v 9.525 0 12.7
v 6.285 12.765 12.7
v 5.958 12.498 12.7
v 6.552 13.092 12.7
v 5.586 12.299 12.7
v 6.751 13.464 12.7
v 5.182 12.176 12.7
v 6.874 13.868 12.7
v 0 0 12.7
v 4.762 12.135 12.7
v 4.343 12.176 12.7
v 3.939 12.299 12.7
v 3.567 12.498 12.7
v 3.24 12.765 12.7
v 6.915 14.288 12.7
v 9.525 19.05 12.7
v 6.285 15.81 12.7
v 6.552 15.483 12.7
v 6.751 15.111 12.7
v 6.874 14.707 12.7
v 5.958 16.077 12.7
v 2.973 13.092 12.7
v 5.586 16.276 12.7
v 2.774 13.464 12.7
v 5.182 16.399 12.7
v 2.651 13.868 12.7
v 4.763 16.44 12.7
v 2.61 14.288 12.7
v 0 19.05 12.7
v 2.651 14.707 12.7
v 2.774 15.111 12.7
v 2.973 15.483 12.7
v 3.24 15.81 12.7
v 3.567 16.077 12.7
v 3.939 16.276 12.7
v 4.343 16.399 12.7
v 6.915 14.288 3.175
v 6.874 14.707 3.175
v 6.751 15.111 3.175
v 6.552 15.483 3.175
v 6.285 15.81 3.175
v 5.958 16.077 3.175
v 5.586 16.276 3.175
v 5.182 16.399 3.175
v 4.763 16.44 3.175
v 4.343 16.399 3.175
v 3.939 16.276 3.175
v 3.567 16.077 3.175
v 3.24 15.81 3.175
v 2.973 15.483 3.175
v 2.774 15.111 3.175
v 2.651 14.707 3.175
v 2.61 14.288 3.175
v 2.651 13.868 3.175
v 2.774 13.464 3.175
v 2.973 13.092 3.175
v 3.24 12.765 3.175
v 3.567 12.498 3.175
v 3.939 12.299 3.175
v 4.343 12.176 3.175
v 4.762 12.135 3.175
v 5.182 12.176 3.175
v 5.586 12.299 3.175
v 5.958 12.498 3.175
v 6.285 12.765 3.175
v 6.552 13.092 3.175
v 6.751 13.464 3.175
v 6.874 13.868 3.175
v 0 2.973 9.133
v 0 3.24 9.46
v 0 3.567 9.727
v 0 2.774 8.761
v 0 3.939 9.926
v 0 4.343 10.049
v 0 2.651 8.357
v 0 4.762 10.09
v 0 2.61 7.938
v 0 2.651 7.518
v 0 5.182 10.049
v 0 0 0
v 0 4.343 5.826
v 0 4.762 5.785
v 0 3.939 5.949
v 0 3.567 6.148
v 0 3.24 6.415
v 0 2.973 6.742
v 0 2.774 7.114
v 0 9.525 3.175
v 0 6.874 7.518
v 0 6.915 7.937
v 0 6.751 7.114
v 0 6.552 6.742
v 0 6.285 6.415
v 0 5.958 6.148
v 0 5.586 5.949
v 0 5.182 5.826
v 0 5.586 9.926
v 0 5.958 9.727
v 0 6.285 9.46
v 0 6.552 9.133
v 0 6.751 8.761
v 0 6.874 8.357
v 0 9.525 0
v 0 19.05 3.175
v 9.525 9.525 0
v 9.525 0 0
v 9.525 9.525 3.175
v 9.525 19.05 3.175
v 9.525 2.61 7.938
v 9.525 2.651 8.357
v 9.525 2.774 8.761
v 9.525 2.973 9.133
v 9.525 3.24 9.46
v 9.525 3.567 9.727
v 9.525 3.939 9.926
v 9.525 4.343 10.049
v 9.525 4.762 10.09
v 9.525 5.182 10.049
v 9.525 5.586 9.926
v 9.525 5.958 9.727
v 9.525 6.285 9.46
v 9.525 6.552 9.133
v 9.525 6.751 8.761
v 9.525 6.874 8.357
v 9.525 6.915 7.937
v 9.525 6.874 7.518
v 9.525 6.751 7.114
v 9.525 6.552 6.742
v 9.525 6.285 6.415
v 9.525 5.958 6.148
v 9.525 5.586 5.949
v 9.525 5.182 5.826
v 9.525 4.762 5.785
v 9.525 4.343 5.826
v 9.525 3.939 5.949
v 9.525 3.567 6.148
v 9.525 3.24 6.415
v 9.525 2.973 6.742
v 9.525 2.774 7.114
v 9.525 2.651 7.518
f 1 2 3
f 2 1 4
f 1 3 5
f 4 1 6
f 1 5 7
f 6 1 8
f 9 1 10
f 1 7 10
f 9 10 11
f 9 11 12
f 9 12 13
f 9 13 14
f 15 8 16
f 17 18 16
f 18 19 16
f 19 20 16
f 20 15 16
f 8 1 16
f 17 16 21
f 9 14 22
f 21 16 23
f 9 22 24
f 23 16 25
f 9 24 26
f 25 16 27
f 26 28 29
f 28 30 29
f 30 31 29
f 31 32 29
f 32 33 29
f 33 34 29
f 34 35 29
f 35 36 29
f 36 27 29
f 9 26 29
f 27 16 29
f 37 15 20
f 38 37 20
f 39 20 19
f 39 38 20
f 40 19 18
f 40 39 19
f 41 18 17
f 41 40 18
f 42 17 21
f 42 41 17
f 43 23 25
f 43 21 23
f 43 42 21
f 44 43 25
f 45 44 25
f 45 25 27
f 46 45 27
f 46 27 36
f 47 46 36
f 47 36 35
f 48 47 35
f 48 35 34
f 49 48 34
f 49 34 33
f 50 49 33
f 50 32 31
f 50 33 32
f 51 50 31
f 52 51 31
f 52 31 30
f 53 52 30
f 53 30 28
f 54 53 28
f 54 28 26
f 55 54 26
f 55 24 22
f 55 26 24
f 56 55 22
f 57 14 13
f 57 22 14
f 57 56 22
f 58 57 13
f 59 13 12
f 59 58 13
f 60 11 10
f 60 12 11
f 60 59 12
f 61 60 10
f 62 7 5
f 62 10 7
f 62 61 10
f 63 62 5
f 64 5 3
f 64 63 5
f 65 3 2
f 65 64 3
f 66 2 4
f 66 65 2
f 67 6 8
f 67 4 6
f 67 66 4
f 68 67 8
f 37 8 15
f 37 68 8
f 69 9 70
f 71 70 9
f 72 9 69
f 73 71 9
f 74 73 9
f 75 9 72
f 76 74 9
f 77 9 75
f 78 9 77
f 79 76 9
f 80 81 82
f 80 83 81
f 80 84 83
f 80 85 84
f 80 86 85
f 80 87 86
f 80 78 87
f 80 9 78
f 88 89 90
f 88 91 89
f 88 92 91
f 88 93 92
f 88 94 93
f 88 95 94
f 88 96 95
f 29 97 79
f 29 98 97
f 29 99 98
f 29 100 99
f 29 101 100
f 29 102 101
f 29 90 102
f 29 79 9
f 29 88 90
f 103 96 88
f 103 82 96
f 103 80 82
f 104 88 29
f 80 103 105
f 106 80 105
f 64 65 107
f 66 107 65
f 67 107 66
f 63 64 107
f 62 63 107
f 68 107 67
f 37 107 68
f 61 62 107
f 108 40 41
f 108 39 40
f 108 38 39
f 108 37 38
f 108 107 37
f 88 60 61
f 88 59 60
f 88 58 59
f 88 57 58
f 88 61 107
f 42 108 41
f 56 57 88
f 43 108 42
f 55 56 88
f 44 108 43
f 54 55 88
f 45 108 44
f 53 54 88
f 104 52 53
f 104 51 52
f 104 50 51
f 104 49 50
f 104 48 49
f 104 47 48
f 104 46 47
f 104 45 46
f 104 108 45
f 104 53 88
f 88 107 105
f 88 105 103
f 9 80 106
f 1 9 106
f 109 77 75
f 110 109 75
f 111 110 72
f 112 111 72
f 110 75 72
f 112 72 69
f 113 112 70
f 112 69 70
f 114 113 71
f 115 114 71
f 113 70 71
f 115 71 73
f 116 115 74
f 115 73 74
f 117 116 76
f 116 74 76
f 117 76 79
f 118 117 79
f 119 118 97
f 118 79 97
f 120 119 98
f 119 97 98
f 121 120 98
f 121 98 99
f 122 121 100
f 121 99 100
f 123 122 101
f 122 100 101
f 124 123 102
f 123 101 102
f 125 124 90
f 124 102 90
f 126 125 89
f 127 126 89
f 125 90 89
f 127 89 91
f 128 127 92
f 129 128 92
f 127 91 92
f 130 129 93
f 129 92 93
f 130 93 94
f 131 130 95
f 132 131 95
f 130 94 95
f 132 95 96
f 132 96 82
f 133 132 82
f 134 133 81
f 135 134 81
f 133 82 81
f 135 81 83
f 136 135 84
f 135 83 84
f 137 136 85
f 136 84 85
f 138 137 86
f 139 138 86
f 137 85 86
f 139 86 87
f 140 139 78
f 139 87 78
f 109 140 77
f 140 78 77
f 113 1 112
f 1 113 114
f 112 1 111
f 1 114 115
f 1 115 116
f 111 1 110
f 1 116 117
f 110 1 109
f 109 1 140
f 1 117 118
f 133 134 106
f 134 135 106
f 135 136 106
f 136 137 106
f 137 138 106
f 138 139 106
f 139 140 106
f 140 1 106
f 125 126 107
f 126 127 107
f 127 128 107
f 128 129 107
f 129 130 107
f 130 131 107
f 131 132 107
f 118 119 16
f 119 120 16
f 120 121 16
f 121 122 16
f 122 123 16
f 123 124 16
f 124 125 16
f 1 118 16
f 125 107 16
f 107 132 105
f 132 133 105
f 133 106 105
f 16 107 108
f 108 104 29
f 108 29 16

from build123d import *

# Parameters (mm, degrees)
F0_W      = 9.525
F0_H      = 19.05
F0_R      = 2.15265
F1_DEPTH  = 15.875
F2_W      = 9.525
F2_H      = 3.175
F3_DEPTH  = 9.525
F4_R      = 2.15265
F5_DEPTH  = 9.525
F3_FACE_W = 9.525
F3_FACE_H = 3.175
F6_DEPTH  = 9.525


with BuildPart() as f1:
    # F0 (on Top) → F1 (new body)
    with BuildSketch(Plane.XY):
        with Locations((4.7625, 9.525)):
            Rectangle(F0_W, F0_H)
        with Locations((4.7625, 14.2875)):
            Circle(F0_R, mode=Mode.SUBTRACT)
    extrude(amount=F1_DEPTH)

    # F2 (on face) → F3 (cut)
    with BuildSketch(Plane(origin=(0, 19.05, 0), x_dir=(-1, 0, 0), z_dir=(0, 1, 0))):
        with Locations((-4.7625, 1.5875)):
            Rectangle(F2_W, F2_H)
        with Locations((-4.7625, 14.2875)):
            Rectangle(F2_W, F2_H)
    extrude(amount=-F3_DEPTH, mode=Mode.SUBTRACT)

    # F4 (on face) → F5 (cut, through all)
    with BuildSketch(Plane(origin=(0, 0, 0), x_dir=(0, -1, 0), z_dir=(-1, 0, 0))):
        with Locations((-4.7625, 7.9375)):
            Circle(F4_R)
    extrude(amount=-F5_DEPTH, mode=Mode.SUBTRACT)

    # F3_face (on face) → F6 (cut, through all)
    with BuildSketch(Plane(origin=(4.7625, 9.525, 14.2875), x_dir=(-1, 0, 0), z_dir=(0, 1, 0))):
        Rectangle(F3_FACE_W, F3_FACE_H)
    extrude(amount=-F6_DEPTH, mode=Mode.SUBTRACT)


solid = f1.part
